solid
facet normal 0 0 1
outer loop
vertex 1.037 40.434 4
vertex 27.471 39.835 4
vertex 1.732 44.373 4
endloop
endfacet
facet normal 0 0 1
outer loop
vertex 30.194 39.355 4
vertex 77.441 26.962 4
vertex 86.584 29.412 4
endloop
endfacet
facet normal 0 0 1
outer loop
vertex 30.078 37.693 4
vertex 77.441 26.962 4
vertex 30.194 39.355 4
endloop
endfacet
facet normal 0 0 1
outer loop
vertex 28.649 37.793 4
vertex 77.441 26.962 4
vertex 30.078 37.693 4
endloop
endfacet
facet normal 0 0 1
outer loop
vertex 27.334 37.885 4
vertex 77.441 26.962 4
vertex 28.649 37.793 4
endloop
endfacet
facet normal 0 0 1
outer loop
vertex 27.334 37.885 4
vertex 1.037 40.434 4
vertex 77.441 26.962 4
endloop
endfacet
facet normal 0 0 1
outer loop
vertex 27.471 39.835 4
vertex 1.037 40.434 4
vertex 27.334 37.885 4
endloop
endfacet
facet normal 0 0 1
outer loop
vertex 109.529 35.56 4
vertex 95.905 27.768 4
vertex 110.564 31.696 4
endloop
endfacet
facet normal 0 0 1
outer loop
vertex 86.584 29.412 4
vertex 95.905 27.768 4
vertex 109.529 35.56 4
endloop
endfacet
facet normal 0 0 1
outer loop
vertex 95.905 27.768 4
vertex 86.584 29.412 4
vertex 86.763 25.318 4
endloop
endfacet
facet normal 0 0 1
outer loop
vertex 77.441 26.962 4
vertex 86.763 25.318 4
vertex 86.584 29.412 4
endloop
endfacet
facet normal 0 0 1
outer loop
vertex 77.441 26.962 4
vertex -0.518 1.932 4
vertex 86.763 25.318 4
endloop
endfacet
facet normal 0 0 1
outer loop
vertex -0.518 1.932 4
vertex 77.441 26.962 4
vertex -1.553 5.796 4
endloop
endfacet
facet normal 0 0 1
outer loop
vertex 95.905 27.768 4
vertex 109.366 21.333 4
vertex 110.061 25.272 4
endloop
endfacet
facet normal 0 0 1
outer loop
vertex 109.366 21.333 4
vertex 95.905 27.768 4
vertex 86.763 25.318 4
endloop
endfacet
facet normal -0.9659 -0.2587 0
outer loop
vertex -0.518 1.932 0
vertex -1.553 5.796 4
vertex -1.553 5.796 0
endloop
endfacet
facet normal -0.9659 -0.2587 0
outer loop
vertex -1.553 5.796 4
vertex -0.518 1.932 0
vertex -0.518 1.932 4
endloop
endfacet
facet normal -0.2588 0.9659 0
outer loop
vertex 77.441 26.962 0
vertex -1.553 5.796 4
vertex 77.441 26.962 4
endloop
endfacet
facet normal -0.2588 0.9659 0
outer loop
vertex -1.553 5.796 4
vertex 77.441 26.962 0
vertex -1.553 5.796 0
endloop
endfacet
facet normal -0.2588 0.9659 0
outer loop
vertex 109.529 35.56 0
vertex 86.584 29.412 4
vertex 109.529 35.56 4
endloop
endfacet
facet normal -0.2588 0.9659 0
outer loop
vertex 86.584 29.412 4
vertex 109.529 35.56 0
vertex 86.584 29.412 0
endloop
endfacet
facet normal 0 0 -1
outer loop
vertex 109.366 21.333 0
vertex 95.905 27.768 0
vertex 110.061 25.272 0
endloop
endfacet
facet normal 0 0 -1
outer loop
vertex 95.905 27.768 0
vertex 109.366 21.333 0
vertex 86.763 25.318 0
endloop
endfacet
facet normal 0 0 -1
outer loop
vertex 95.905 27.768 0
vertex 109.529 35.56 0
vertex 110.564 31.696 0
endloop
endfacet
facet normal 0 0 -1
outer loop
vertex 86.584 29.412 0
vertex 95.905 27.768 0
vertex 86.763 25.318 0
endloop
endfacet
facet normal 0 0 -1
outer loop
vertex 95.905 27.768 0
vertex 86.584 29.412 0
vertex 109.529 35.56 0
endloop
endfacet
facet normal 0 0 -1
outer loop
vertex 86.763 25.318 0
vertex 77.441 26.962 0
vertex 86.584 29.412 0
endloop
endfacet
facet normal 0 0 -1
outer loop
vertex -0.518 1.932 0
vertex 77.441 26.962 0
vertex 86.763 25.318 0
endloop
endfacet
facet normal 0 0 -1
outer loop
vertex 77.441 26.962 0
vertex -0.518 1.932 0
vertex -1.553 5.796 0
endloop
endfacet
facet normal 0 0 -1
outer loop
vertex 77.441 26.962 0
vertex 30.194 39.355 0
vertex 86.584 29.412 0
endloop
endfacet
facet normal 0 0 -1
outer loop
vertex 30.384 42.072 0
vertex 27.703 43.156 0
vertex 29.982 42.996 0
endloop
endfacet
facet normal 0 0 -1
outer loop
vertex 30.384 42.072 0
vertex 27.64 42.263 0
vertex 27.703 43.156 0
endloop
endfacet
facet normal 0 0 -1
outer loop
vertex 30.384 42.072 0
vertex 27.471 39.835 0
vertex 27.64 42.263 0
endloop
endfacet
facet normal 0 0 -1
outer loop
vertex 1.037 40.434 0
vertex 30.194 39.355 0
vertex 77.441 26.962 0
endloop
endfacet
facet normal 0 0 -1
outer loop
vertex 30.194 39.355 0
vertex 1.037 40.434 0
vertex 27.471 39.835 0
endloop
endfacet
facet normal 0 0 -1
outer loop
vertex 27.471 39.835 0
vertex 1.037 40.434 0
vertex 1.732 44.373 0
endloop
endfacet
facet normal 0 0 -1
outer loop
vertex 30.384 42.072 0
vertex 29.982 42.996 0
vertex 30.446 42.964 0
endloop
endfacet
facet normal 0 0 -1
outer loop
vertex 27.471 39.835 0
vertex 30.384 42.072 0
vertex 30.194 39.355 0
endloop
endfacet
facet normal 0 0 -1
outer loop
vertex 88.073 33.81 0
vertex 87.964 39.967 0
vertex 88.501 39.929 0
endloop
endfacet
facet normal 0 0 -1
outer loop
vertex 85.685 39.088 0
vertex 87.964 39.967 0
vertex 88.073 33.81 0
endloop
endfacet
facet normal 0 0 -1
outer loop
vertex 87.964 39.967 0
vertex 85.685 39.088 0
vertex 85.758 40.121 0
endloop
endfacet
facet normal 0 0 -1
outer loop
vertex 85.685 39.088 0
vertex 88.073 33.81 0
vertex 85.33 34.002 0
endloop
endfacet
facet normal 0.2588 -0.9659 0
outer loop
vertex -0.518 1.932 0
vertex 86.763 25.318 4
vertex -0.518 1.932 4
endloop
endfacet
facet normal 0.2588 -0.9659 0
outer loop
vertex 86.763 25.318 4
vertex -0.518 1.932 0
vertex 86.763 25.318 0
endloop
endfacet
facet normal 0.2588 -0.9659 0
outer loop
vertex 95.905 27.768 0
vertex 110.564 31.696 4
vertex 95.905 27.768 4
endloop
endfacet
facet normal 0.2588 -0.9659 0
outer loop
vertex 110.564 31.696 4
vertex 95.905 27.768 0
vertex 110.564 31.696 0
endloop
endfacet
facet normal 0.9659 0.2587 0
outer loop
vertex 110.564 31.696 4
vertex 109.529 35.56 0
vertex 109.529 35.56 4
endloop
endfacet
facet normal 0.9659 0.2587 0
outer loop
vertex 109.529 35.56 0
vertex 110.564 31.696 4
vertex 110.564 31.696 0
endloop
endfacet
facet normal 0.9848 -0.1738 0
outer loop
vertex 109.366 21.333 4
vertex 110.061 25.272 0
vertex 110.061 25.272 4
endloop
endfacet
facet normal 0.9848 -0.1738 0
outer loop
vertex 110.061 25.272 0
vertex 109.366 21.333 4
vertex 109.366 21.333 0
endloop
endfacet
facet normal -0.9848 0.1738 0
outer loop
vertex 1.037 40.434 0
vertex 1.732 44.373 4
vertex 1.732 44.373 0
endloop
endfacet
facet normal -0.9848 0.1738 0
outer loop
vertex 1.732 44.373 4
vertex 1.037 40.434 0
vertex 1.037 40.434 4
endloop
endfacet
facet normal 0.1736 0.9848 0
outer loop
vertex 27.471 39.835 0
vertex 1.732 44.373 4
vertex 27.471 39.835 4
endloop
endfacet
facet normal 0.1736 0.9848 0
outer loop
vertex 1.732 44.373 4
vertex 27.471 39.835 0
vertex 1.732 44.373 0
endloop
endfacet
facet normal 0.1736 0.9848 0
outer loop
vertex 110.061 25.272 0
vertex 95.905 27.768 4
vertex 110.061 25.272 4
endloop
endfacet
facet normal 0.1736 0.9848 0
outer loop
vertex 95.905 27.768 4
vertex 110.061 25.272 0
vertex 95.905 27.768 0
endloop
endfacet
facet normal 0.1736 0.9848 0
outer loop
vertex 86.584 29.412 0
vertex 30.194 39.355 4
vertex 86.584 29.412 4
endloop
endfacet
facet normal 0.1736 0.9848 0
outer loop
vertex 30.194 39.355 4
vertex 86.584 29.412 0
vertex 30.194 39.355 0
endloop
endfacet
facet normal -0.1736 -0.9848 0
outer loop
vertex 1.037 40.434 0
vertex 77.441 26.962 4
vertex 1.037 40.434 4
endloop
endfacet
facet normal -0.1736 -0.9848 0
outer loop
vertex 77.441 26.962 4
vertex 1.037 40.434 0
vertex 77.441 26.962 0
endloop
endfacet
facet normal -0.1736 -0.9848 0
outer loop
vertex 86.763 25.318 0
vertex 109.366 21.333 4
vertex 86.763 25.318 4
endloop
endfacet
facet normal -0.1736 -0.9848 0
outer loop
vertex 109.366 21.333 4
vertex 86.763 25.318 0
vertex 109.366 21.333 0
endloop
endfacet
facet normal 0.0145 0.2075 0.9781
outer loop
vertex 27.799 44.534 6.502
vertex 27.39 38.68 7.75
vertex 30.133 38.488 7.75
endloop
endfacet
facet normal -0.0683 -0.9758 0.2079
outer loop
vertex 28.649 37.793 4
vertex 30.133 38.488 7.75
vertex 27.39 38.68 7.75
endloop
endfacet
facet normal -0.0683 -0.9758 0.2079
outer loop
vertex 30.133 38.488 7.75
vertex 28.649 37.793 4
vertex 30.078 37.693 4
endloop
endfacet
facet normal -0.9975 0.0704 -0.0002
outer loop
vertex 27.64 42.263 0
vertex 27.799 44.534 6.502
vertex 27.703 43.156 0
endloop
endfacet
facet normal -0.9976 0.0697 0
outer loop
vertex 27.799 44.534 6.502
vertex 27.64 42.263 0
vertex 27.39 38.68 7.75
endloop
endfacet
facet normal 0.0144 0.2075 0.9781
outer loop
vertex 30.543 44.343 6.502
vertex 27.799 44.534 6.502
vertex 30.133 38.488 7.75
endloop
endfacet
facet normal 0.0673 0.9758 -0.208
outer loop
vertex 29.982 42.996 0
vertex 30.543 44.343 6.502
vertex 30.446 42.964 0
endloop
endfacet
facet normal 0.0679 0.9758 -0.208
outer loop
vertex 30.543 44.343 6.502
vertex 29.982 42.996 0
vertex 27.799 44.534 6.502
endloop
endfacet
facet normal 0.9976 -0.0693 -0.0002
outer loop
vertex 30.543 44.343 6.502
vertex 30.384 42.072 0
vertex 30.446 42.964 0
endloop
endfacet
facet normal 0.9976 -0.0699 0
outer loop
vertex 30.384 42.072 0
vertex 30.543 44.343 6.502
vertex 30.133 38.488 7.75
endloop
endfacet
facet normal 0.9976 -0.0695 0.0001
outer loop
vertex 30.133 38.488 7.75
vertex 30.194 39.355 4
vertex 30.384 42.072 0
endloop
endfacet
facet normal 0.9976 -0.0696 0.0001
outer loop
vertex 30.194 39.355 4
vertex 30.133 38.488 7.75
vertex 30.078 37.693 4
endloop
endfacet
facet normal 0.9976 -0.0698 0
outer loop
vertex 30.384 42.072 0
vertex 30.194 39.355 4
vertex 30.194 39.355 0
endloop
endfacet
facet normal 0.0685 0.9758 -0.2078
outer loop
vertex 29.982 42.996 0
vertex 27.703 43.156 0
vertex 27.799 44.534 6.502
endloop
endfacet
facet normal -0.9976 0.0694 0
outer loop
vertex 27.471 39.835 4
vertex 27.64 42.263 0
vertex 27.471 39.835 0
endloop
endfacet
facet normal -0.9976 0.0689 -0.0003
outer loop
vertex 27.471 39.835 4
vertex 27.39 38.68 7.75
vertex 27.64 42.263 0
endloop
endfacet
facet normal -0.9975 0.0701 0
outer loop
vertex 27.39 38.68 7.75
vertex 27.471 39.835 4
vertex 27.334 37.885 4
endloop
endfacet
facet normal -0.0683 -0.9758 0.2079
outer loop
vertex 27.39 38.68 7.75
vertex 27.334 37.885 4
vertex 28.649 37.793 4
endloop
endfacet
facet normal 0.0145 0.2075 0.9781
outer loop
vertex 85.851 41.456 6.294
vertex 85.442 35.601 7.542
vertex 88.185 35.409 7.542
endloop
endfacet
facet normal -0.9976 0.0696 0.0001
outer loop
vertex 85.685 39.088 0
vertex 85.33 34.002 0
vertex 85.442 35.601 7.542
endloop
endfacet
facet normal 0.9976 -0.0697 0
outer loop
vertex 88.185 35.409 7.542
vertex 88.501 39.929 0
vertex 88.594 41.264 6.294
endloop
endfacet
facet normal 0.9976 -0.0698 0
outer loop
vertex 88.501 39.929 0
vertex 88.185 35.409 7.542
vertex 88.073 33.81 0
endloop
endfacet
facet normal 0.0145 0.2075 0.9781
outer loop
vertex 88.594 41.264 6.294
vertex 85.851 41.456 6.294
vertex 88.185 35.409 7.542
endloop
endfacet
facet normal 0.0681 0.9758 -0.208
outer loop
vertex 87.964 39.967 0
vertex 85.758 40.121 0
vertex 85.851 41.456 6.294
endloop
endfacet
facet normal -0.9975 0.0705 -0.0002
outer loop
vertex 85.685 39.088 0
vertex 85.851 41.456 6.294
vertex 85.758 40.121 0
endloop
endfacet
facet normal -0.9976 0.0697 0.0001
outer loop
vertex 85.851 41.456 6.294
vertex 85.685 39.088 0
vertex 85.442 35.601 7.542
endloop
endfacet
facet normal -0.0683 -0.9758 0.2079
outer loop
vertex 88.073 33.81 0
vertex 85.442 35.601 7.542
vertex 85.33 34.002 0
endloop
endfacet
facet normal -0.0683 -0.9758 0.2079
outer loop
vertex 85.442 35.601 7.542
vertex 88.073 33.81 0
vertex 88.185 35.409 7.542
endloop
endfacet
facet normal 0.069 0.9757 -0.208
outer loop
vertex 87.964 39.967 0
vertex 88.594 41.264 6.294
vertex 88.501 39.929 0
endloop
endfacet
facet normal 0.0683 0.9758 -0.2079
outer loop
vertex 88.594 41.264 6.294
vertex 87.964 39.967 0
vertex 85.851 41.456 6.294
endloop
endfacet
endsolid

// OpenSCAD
difference() {
	union() {
		// extrude inkscape vector drawing
		rotate(a=[-12,0,-4]) 
			translate(v=[-2,0,6])
				linear_extrude(height=12, convexity=30) 
					import(file="haiku.dxf", layer="Line1");
		rotate(a=[8,0,1]) 
			translate(v=[-2,-1,-4])
				linear_extrude(height=8, convexity=30) 
					import(file="haiku.dxf", layer="Line2");
		rotate(a=[10,0,6]) 
			translate(v=[-2,0,-5])
				linear_extrude(height=20, convexity=30) 
					import(file="haiku.dxf", layer="Line3");

		// add the lines across text
		rotate(a=[0,0,15])	
			translate(v=[0,2,0])
				cube(size=[115,4,4]);
		rotate(a=[0,0,-10])
			translate(v=[-6,40,0])
				cube(size=[110,4,4]);

		// connect the dots in the i's
		rotate(a=[-12,0,-4])
			translate(v=[24.625,38,+8])
				cube(size=[2.75,6,8]);
		rotate(a=[-12,0,-4])
			translate(v=[82.75,39,+8])
				cube(size=[2.75,6,8]);
	}
	// make a smooth bottom surface to print from
	translate(v=[50,50,-50])
		cube(size=[200,200,100], center=true);
}
